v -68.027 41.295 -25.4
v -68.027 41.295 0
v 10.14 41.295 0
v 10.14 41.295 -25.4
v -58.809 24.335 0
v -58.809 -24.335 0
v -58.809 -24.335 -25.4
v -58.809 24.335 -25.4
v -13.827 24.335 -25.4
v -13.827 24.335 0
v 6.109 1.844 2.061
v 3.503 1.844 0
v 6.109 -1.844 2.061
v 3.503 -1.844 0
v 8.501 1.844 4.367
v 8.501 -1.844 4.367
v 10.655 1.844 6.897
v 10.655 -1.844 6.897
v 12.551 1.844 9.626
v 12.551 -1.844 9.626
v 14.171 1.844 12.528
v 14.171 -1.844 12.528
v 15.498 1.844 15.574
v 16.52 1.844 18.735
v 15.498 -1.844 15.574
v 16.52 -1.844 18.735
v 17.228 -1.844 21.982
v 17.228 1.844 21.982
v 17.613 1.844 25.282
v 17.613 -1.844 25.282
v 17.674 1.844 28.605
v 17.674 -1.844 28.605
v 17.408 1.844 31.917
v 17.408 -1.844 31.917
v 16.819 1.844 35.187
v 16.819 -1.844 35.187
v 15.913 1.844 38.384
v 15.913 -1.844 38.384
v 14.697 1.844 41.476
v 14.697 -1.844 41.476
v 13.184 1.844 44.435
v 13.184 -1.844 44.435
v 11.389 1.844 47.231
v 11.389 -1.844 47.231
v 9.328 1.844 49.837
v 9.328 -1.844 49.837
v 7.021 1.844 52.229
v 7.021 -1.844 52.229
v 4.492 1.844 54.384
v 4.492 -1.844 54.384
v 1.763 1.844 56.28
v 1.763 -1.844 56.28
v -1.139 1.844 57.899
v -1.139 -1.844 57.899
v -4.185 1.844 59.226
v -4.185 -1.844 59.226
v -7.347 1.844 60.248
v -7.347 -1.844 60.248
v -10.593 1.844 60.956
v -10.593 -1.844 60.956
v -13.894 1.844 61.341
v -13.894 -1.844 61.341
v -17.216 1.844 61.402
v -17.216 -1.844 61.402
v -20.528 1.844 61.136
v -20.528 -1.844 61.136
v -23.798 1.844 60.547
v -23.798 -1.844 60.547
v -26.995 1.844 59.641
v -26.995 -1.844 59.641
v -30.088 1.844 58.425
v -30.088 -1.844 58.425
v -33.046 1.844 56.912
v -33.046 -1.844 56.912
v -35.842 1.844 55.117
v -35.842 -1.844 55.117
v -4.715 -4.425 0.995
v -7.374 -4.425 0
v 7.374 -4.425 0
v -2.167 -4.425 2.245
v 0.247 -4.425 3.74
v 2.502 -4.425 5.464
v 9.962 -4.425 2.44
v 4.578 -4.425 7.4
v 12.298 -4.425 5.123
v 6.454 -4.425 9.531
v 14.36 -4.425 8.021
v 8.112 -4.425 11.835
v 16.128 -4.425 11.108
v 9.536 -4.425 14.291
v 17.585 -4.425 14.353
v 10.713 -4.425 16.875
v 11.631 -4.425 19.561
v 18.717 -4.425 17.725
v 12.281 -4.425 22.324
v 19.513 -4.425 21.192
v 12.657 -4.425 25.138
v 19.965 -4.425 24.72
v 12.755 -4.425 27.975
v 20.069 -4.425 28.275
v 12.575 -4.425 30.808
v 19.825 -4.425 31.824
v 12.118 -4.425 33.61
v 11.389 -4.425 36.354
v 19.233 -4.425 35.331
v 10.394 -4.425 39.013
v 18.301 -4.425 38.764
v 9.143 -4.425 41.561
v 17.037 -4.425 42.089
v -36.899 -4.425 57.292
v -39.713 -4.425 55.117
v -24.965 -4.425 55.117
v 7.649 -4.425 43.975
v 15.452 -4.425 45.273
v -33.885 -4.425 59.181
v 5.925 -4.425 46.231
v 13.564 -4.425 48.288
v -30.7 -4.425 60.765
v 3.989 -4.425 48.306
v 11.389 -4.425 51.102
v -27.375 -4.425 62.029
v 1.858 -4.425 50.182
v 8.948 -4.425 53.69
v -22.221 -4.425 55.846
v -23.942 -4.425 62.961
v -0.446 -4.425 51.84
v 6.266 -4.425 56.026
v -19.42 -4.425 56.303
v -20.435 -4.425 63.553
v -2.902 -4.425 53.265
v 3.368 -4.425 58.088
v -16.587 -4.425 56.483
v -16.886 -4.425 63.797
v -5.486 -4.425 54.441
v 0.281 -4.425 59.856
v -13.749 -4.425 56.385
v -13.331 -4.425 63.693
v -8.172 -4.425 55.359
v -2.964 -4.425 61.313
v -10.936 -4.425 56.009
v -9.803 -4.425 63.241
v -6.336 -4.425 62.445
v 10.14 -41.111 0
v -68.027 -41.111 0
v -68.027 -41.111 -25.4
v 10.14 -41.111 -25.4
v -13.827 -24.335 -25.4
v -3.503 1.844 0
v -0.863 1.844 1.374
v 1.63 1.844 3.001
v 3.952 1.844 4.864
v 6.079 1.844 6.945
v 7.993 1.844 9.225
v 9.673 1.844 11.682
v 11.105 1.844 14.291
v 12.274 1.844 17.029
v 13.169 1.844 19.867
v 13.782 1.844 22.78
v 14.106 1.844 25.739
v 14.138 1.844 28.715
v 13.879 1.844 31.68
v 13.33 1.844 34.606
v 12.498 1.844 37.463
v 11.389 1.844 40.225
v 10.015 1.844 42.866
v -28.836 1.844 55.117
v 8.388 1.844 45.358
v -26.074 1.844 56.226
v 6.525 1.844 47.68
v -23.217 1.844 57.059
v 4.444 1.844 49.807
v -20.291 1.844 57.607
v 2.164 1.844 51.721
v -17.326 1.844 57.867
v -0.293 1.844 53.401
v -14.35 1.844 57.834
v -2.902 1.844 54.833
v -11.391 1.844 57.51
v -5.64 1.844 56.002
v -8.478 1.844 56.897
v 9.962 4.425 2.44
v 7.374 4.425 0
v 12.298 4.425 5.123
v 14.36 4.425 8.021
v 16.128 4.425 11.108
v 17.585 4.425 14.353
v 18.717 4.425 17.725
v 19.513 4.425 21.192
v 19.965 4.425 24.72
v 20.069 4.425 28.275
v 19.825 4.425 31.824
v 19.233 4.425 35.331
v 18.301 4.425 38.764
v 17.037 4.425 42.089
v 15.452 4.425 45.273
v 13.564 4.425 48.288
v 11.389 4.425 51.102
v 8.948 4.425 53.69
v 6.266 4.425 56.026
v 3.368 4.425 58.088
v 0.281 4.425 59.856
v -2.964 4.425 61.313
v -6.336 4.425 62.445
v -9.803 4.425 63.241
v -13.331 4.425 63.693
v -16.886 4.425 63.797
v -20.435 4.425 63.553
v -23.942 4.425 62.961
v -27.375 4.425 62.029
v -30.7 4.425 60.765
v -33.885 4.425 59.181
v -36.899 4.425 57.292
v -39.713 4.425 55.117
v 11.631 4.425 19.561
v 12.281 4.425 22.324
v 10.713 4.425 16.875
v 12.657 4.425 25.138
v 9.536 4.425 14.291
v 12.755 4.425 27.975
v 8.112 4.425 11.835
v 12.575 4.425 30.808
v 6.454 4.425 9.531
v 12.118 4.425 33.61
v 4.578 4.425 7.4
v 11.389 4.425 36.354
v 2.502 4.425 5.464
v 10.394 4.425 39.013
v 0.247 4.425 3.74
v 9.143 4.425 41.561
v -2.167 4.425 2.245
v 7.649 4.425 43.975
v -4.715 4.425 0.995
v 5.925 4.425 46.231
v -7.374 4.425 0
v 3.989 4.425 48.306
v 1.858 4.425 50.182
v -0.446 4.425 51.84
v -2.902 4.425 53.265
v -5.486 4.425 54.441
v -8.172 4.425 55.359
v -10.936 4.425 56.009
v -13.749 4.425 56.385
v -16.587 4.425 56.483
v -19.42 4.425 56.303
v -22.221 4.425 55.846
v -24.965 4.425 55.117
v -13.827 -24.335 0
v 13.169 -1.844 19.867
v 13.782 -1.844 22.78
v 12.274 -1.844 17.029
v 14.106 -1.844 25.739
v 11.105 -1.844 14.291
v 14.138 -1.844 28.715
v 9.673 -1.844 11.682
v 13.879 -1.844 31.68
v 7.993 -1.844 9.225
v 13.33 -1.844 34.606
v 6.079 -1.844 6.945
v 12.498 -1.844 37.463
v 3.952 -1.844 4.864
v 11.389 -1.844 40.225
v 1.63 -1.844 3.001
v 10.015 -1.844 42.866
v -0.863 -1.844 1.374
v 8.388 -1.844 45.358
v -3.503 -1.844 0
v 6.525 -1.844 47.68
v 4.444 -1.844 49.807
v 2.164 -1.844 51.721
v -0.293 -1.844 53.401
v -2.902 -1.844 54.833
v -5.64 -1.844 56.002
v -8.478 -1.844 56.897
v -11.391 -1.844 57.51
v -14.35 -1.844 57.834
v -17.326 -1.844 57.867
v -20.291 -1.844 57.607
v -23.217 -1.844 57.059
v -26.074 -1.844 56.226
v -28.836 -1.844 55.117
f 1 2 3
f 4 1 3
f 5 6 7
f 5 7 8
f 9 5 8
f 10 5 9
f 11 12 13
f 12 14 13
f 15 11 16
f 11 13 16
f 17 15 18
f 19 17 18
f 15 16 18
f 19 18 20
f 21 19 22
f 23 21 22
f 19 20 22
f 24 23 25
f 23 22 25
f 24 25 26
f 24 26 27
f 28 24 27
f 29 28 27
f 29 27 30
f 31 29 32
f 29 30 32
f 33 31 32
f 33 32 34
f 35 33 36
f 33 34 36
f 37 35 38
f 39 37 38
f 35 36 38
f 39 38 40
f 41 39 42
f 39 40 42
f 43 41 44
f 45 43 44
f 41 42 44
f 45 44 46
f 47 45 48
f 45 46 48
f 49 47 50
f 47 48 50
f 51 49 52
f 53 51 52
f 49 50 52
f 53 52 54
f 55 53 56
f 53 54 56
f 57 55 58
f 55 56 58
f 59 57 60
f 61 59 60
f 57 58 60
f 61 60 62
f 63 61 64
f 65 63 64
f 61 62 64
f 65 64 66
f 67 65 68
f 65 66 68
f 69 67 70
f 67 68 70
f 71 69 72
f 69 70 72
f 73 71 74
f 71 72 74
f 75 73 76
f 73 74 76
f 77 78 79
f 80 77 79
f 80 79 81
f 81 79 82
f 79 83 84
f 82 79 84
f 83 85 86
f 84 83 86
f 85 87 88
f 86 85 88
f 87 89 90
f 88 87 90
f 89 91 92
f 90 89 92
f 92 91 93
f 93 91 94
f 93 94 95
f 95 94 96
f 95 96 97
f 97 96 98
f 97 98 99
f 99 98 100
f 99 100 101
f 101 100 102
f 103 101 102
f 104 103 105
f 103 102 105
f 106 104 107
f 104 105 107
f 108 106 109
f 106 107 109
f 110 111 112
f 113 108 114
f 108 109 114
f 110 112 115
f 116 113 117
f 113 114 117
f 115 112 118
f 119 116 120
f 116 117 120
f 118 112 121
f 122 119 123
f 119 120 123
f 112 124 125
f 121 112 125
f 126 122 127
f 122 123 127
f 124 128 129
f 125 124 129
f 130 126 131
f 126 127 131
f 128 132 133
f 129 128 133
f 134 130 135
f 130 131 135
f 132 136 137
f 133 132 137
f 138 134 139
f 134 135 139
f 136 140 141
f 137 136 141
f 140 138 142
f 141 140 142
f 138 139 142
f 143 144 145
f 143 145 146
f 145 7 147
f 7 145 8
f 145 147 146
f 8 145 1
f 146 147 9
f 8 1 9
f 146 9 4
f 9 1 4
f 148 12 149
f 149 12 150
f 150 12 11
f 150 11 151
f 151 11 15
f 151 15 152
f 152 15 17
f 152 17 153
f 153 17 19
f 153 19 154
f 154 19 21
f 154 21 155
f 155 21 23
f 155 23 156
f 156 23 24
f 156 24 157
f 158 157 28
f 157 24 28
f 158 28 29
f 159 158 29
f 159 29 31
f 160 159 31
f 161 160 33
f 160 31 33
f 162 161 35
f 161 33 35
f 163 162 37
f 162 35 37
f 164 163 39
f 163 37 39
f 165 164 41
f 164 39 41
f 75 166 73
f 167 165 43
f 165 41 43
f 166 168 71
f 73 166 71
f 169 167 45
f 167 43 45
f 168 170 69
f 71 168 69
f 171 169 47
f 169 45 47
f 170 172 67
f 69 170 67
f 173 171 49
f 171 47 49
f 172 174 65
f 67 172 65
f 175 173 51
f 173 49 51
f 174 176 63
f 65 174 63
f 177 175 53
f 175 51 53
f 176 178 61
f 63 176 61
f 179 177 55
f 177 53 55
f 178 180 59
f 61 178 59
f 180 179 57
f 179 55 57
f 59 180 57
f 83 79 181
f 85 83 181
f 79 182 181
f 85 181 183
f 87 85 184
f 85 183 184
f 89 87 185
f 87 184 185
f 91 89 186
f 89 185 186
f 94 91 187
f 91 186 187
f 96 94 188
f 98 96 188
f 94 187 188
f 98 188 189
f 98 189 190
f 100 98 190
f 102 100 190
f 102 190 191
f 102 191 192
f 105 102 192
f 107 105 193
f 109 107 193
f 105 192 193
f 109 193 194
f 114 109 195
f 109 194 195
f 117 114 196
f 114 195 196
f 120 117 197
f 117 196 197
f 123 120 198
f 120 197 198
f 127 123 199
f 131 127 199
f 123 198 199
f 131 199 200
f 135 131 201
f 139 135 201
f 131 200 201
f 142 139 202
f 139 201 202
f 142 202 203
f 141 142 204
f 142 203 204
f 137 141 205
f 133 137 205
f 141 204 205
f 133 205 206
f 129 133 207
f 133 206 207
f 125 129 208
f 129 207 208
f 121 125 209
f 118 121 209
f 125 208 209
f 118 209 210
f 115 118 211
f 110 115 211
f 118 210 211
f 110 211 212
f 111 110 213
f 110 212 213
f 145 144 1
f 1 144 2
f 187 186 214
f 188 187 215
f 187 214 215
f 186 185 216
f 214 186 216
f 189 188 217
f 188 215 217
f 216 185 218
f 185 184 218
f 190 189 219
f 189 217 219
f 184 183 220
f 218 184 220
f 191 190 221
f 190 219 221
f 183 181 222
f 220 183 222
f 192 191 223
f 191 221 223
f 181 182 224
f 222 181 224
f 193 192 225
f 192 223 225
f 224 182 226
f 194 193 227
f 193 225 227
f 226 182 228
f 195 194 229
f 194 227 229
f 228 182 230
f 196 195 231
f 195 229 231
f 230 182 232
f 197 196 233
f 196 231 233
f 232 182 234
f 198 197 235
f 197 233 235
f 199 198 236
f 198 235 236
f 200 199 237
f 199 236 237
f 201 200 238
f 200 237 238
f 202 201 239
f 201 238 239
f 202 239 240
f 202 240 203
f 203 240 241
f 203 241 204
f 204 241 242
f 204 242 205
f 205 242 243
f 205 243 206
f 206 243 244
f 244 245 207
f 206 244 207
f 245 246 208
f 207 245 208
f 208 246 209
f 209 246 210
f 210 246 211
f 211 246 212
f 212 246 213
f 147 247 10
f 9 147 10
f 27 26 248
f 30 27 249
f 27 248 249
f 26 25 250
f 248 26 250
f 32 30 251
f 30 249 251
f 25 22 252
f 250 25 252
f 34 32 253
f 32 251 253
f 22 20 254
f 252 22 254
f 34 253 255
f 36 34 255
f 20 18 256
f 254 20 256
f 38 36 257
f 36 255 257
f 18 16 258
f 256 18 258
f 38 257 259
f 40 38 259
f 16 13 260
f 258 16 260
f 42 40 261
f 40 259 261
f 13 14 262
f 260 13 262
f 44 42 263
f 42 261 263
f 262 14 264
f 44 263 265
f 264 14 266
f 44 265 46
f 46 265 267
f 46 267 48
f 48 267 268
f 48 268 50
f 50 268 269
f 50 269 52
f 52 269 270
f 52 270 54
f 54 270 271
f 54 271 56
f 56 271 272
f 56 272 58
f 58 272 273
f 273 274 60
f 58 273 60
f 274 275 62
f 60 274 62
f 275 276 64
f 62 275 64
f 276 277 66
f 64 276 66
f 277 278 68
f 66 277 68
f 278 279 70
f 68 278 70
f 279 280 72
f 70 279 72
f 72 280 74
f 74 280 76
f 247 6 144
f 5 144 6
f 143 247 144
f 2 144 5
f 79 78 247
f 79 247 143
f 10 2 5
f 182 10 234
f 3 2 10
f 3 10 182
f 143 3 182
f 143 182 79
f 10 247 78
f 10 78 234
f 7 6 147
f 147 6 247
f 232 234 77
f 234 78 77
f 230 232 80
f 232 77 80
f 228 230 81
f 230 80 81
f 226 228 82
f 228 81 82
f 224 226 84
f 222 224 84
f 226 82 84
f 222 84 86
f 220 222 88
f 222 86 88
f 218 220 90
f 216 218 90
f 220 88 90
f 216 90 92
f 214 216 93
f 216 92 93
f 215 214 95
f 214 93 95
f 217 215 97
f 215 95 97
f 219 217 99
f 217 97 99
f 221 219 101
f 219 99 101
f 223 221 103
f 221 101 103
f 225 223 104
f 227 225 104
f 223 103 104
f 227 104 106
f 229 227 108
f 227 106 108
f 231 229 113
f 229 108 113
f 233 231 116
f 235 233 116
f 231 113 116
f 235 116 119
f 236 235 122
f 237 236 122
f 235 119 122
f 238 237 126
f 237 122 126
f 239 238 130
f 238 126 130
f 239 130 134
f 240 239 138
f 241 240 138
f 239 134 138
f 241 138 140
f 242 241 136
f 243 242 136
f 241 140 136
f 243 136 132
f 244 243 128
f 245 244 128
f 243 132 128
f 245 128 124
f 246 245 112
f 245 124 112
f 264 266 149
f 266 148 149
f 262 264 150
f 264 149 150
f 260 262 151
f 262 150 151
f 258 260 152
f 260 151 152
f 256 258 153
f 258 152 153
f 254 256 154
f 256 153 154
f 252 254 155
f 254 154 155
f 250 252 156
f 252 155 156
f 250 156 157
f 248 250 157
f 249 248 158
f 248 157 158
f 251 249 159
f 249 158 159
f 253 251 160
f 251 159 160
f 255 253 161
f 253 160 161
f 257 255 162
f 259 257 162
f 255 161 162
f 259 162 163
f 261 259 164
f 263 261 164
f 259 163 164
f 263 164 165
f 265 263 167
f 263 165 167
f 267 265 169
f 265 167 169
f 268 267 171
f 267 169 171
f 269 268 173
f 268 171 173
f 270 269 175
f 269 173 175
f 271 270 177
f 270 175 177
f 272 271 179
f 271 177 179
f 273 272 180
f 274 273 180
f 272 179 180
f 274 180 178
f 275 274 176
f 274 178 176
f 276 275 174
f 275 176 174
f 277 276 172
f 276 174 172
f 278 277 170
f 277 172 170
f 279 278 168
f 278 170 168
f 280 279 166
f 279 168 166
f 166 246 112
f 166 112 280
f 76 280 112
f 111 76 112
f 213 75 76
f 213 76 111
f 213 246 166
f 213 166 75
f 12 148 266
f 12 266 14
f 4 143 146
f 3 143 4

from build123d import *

# Parameters (mm, degrees)
F0_W     = 14.748384
F0_H     = 8.849032
F0_W_2   = 7.005484
F0_H_2   = 3.687096
F3_W     = 78.166454
F3_H     = 82.406614
F3_W_2   = 44.982581
F3_H_2   = 48.669678
F4_DEPTH = 25.4
F5_DEPTH = 2.54


with BuildPart() as f2:
    # F2: sweep along a path in F1
    with BuildLine(Plane.XZ) as f2_path:
        ThreePointArc((0, 27.558451), (-16.169621, 43.728072), (-32.339242, 27.558451))
    # F0 (on Top) → F2 (sweep)
    with BuildSketch(Plane.XY):
        Rectangle(F0_W, F0_H)
        Rectangle(F0_W_2, F0_H_2, mode=Mode.SUBTRACT)
    sweep(path=f2_path.line)

    # F3 (on Top) → F4 (join)
    with BuildSketch(Plane.XY):
        with Locations((-28.943711, 0.092177)):
            Rectangle(F3_W, F3_H)
        with Locations((-36.317903, 0)):
            Rectangle(F3_W_2, F3_H_2, mode=Mode.SUBTRACT)
    extrude(amount=-F4_DEPTH)

    # F3 (on Top) → F5 (cut)
    with BuildSketch(Plane.XY):
        with Locations((-36.317903, 0)):
            Rectangle(F3_W_2, F3_H_2)
    extrude(amount=-F5_DEPTH, mode=Mode.SUBTRACT)


solid = f2.part
